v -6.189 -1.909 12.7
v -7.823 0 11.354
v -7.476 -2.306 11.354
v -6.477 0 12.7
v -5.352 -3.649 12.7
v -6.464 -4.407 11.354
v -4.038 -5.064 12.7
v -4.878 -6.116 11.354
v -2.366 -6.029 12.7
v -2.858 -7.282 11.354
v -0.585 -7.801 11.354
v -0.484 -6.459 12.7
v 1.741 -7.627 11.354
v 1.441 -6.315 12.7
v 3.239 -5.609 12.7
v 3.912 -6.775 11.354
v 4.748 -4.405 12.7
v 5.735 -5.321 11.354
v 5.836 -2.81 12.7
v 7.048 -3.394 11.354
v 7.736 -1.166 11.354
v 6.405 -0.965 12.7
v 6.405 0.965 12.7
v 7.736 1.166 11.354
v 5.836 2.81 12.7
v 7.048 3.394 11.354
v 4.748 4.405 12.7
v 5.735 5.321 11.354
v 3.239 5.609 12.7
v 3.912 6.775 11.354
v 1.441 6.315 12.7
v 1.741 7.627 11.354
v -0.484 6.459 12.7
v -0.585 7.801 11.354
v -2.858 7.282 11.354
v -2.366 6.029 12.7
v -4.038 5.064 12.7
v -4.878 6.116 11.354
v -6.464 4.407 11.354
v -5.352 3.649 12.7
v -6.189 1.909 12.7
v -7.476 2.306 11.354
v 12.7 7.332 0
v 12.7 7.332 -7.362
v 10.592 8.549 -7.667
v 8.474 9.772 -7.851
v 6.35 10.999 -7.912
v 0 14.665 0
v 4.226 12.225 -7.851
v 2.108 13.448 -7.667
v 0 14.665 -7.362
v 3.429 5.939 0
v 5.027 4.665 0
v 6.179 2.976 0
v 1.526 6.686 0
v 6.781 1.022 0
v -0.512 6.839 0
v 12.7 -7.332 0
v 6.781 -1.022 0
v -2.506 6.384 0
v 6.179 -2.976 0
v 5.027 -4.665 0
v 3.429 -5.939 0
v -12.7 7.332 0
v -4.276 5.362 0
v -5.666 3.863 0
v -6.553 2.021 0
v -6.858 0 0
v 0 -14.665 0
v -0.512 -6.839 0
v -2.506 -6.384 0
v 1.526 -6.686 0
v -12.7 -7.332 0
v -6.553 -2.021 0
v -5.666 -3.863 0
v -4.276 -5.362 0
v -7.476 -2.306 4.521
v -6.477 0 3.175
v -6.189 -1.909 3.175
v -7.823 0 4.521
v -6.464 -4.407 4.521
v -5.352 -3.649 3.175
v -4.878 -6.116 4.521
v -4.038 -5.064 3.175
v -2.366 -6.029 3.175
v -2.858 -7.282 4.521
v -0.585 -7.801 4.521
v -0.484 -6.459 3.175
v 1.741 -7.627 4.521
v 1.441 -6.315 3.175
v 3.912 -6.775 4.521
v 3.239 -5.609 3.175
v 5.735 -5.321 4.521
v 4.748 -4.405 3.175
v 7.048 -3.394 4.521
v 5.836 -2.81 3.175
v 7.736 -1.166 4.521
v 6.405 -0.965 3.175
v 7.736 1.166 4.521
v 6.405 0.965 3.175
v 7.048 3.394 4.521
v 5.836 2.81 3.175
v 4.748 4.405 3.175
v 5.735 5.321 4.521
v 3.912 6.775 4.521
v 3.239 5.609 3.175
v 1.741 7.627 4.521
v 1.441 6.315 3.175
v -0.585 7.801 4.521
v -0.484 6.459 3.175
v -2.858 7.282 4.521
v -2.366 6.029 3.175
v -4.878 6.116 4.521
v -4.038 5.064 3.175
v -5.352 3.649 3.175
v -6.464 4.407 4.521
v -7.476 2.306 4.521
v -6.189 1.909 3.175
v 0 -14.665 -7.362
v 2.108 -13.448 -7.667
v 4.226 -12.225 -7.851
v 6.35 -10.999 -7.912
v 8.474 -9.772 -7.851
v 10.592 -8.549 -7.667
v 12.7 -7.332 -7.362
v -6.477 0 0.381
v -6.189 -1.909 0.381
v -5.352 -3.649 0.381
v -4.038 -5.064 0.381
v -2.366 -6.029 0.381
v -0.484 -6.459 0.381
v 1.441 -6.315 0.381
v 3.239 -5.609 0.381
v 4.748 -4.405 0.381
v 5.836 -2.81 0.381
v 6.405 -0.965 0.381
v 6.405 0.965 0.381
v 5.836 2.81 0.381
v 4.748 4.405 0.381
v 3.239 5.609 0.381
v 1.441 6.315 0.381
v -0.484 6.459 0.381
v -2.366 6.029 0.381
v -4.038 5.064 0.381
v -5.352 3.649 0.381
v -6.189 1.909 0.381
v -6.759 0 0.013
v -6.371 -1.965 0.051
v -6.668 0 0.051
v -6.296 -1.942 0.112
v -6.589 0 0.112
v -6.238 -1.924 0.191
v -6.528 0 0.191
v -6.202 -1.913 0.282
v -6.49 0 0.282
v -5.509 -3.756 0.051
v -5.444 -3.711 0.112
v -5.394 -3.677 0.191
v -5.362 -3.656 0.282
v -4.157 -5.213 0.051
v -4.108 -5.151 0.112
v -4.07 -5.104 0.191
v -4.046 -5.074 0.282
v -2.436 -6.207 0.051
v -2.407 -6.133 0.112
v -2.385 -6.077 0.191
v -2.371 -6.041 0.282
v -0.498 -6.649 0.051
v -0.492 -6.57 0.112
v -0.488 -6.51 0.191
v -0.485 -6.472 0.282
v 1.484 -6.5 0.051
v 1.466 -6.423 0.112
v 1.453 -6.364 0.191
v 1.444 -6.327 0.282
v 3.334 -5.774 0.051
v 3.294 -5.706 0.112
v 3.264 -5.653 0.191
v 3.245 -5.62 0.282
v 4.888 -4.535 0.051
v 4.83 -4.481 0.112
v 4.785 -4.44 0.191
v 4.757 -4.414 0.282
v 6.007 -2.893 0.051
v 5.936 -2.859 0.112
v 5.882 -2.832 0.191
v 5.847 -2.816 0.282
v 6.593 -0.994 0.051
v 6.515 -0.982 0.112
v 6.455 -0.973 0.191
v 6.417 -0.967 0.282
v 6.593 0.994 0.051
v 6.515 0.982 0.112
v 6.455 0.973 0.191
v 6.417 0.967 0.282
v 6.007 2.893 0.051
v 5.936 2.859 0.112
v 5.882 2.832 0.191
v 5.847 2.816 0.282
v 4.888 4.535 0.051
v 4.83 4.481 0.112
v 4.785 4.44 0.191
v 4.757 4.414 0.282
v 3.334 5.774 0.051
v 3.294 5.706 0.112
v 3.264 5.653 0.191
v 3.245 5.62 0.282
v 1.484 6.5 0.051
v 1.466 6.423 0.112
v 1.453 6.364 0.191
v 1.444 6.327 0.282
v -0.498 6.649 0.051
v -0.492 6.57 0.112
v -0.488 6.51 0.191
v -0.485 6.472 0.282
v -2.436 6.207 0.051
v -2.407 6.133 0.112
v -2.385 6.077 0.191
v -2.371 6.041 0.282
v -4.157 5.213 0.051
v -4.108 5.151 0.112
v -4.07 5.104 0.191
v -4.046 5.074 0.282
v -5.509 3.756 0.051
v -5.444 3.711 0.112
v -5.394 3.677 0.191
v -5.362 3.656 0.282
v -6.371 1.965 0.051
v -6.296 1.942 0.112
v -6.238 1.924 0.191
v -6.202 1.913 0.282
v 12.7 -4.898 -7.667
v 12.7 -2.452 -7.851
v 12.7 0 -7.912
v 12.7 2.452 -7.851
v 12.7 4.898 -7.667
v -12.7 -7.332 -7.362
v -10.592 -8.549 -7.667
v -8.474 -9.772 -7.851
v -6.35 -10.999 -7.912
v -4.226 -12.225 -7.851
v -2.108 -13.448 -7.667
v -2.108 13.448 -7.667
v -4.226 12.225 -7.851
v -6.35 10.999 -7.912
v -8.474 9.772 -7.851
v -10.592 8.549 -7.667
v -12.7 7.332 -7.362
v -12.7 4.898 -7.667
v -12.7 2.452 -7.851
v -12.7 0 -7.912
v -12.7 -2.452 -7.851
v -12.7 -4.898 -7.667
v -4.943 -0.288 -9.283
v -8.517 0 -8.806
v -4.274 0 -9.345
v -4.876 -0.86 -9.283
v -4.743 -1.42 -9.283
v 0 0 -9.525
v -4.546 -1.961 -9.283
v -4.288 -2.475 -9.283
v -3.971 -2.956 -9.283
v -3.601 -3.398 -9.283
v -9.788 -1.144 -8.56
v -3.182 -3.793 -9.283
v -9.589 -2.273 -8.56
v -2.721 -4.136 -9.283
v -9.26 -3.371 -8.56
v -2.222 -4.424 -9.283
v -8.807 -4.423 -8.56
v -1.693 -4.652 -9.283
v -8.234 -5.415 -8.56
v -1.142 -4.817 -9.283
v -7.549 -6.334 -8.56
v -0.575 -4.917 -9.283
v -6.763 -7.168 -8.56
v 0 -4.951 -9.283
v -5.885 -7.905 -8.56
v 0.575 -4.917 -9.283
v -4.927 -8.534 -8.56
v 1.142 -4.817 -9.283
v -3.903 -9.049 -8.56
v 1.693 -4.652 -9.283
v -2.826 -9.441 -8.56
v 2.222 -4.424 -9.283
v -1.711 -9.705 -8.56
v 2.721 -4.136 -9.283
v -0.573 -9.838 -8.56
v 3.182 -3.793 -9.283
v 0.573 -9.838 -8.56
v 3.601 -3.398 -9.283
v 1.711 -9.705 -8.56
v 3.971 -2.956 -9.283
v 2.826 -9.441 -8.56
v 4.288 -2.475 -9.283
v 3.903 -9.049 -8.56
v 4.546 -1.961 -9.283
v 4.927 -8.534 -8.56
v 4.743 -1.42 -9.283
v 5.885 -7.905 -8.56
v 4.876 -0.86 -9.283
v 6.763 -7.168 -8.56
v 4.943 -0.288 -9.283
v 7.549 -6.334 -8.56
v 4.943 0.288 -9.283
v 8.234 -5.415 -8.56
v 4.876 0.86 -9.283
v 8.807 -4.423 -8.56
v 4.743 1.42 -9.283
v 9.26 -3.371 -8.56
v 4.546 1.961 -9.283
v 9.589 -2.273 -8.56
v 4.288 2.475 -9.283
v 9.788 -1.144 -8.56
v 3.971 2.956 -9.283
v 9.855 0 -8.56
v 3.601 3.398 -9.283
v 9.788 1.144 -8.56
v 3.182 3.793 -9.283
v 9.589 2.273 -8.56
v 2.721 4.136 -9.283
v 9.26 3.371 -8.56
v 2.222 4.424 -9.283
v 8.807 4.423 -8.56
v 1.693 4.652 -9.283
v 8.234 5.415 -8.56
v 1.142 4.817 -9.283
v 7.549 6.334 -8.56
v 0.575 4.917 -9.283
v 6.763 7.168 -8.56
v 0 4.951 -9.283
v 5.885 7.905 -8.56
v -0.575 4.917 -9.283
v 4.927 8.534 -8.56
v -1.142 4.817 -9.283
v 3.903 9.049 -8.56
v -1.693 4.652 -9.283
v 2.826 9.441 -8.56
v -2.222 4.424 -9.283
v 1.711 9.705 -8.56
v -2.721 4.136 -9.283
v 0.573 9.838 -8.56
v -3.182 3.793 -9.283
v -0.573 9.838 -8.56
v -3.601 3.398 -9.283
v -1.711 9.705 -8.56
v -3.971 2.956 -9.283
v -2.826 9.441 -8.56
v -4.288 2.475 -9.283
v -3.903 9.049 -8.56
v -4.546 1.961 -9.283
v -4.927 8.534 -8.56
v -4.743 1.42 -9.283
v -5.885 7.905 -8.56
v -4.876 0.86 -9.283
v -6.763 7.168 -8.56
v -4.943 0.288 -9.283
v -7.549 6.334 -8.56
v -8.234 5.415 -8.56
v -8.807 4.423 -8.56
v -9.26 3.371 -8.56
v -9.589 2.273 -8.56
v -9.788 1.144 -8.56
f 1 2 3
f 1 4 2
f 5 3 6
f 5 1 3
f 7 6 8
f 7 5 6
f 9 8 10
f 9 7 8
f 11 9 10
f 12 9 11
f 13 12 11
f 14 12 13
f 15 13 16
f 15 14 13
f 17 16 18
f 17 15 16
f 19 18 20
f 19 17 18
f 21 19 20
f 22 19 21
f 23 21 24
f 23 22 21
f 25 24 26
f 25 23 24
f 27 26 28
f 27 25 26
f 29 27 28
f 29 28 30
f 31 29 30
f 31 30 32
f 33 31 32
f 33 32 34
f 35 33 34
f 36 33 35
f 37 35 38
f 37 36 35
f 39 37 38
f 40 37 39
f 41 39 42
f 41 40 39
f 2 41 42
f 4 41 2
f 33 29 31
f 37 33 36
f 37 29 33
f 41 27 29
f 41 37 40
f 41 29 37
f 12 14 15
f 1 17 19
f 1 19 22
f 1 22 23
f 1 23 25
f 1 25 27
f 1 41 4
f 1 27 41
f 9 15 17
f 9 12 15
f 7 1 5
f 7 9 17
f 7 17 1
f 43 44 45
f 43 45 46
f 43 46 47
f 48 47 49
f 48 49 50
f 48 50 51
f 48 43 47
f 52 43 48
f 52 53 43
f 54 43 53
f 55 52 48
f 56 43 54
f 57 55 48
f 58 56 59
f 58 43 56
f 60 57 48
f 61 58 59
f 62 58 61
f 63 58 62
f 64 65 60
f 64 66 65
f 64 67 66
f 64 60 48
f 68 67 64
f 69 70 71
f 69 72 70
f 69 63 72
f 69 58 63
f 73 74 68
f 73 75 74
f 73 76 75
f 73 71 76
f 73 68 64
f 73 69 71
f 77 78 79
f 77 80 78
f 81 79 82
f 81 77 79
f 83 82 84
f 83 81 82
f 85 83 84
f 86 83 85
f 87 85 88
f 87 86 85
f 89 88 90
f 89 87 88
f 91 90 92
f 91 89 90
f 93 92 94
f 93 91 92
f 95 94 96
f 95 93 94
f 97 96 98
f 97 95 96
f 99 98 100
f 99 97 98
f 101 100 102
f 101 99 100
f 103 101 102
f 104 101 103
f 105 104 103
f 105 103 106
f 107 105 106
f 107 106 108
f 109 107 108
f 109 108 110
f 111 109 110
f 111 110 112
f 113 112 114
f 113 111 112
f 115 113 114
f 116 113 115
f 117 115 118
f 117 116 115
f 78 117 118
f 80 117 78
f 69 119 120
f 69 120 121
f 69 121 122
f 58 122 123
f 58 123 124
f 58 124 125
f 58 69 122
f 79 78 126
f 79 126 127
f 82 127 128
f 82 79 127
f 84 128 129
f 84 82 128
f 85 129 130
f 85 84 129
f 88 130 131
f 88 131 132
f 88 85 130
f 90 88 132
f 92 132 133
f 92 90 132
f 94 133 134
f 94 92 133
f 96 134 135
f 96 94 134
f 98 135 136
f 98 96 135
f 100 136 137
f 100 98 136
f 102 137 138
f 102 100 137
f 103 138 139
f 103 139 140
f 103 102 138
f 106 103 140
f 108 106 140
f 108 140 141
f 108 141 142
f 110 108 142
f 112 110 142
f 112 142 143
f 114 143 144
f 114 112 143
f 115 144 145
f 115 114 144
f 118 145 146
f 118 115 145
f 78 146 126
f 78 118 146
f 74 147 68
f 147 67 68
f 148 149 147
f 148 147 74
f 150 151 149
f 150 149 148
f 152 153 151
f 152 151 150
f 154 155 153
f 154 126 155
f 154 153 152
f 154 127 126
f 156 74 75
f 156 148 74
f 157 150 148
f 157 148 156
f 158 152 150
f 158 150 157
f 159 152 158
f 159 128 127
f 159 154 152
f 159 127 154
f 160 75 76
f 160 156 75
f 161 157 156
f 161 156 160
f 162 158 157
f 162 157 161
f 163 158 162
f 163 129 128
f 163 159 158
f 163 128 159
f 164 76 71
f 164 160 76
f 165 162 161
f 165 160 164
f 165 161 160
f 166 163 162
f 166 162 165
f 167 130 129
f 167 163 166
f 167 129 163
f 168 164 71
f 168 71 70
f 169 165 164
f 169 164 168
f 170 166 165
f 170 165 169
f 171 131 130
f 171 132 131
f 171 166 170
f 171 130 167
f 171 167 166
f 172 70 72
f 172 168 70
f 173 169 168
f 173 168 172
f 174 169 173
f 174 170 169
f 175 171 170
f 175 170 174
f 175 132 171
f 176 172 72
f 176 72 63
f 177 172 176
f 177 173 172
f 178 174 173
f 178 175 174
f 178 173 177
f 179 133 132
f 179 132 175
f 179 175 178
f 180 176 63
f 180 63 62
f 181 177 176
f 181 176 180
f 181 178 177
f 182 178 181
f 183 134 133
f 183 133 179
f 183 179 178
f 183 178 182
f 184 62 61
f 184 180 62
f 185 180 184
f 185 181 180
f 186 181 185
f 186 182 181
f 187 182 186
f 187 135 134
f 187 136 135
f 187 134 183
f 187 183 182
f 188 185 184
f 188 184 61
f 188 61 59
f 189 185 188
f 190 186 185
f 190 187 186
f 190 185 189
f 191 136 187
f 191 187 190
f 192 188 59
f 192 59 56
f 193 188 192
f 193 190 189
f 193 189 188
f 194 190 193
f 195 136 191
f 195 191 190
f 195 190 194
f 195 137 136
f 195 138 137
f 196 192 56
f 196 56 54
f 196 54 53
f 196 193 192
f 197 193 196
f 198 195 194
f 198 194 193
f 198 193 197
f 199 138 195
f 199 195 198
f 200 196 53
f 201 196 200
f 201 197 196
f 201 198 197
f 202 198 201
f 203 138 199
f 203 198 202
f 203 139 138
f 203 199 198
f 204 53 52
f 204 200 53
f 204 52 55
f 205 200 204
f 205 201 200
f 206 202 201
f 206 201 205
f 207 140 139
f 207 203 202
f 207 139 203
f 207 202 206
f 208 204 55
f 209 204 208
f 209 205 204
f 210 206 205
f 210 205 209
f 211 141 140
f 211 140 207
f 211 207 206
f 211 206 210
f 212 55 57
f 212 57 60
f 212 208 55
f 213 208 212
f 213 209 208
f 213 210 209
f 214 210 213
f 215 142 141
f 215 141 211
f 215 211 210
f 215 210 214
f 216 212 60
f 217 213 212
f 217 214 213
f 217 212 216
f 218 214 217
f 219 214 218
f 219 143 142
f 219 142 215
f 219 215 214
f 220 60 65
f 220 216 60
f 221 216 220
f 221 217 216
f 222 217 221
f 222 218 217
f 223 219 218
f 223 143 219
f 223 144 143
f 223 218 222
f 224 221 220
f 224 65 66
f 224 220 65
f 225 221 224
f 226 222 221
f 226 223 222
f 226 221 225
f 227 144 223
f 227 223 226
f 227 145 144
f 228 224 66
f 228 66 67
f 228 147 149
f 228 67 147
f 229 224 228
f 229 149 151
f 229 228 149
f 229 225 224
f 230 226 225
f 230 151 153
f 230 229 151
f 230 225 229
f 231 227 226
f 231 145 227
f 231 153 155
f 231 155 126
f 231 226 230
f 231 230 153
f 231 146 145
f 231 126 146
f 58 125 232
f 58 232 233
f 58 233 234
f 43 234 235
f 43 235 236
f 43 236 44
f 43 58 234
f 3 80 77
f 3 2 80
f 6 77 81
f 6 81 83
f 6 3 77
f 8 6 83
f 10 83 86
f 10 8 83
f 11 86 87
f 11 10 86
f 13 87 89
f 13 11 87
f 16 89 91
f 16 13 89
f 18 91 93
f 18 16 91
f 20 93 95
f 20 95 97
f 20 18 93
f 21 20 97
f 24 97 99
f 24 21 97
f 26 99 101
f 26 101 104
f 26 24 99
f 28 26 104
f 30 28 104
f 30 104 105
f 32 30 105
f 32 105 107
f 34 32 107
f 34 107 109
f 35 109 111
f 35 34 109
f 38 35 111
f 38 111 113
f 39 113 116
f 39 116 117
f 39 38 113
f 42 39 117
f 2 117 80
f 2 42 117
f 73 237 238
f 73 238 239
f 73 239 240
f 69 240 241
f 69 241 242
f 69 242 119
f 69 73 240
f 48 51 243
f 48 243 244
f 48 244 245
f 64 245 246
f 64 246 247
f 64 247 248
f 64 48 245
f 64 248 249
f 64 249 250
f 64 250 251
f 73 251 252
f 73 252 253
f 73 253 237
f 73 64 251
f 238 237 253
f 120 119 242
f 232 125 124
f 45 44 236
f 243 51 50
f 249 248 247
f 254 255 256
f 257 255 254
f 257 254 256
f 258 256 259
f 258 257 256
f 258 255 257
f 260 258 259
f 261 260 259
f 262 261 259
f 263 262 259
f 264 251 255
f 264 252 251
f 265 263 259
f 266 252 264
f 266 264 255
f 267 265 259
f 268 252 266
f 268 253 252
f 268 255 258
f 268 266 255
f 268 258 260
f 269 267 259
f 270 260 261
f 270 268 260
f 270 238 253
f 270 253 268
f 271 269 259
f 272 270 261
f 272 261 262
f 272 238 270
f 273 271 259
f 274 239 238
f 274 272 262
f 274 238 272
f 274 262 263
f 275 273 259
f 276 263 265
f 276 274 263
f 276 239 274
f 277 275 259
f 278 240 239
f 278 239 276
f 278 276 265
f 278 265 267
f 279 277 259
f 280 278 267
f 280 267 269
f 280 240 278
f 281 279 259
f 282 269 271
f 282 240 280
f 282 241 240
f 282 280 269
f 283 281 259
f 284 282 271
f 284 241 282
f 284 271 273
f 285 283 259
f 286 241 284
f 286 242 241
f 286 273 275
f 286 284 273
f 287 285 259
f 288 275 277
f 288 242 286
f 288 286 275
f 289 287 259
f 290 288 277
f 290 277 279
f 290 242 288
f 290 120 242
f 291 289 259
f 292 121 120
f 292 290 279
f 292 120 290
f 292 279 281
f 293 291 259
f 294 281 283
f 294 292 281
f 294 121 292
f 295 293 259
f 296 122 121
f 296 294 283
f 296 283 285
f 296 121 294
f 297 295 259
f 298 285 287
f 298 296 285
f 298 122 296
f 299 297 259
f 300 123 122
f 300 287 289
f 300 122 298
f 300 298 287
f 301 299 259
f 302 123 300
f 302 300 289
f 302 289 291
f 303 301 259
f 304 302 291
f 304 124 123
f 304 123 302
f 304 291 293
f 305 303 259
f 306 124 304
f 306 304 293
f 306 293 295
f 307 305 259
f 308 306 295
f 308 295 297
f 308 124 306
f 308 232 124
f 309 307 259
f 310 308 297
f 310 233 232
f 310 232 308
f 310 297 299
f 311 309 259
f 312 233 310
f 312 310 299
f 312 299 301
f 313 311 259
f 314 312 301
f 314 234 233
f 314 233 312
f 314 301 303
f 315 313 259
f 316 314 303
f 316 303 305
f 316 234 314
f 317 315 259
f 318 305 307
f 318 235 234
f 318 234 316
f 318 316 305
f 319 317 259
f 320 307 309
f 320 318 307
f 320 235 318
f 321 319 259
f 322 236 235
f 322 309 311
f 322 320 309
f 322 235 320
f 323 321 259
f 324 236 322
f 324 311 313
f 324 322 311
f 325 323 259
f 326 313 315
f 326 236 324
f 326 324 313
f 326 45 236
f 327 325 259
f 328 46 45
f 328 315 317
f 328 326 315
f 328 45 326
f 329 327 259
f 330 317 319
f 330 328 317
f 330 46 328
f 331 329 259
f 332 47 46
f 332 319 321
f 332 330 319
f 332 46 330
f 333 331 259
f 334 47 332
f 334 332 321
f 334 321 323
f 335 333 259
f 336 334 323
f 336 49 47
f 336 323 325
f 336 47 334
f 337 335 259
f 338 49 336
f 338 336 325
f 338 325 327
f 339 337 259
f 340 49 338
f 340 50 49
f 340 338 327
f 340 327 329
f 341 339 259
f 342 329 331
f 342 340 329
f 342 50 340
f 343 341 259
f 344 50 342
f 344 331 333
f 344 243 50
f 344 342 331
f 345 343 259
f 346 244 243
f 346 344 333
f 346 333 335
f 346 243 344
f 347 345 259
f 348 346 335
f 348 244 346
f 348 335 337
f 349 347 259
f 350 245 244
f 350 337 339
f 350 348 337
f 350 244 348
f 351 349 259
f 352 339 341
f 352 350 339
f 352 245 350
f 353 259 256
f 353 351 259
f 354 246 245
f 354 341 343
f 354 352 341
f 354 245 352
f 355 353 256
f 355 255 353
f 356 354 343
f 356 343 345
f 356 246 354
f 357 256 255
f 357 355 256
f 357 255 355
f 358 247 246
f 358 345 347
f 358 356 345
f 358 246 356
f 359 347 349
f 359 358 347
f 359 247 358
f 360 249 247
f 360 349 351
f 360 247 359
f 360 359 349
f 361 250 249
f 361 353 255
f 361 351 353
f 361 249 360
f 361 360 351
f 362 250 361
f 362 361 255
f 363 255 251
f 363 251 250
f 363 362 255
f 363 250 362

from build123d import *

# Parameters (mm, degrees)
SKETCH2_OUTSIDE_W  = 78.56
SKETCH2_OUTSIDE_H  = 78.56
CUT_EXTRUDE1_DEPTH = 10.525
FILLET1_R          = 0.381


with BuildPart() as part:
    # Sketch1 → Revolve1 (revolve)
    with BuildSketch(Plane(origin=(0, 0, 0), x_dir=(0, 0, -1), z_dir=(1, 0, 0)), mode=Mode.PRIVATE) as revolve1_sk:
        with BuildLine():
            Line((0, 29.614428494), (0, 6.477))
            Line((0, 6.477), (-3.175, 6.477))
            Line((-3.175, 6.477), (-4.5212, 7.8232))
            Line((-4.5212, 7.8232), (-11.3538, 7.8232))
            Line((-11.3538, 7.8232), (-12.7, 6.477))
            Line((-12.7, 6.477), (-12.7, 0))
            Line((-12.7, 0), (9.525, 0))
            ThreePointArc((9.525, 0), (7.085159222, 15.554259867), (0, 29.614428494))
        make_face()
    revolve(revolve1_sk.sketch.rotate(Axis((0, 0, 0), (0, 0, 1)), 90), axis=Axis((0, 0, 0), (0, 0, 1)))  # turned: the seam where the file's is

    # Sketch2 outside → Cut-Extrude1 (cut, through all)
    with BuildSketch(Plane.XY):
        Rectangle(SKETCH2_OUTSIDE_W, SKETCH2_OUTSIDE_H)
        Polygon((0, 14.664696837), (-12.7, 7.332348419), (-12.7, -7.332348419), (0, -14.664696837), (12.7, -7.332348419), (12.7, 7.332348419), align=None, mode=Mode.SUBTRACT)
    extrude(amount=-CUT_EXTRUDE1_DEPTH, mode=Mode.SUBTRACT)

    # Fillet1
    fillet1_edges = [part.edges().sort_by_distance(p)[0] for p in [
        (6.477, 0, 0),
    ]]
    fillet(fillet1_edges, radius=FILLET1_R)


solid = part.part
